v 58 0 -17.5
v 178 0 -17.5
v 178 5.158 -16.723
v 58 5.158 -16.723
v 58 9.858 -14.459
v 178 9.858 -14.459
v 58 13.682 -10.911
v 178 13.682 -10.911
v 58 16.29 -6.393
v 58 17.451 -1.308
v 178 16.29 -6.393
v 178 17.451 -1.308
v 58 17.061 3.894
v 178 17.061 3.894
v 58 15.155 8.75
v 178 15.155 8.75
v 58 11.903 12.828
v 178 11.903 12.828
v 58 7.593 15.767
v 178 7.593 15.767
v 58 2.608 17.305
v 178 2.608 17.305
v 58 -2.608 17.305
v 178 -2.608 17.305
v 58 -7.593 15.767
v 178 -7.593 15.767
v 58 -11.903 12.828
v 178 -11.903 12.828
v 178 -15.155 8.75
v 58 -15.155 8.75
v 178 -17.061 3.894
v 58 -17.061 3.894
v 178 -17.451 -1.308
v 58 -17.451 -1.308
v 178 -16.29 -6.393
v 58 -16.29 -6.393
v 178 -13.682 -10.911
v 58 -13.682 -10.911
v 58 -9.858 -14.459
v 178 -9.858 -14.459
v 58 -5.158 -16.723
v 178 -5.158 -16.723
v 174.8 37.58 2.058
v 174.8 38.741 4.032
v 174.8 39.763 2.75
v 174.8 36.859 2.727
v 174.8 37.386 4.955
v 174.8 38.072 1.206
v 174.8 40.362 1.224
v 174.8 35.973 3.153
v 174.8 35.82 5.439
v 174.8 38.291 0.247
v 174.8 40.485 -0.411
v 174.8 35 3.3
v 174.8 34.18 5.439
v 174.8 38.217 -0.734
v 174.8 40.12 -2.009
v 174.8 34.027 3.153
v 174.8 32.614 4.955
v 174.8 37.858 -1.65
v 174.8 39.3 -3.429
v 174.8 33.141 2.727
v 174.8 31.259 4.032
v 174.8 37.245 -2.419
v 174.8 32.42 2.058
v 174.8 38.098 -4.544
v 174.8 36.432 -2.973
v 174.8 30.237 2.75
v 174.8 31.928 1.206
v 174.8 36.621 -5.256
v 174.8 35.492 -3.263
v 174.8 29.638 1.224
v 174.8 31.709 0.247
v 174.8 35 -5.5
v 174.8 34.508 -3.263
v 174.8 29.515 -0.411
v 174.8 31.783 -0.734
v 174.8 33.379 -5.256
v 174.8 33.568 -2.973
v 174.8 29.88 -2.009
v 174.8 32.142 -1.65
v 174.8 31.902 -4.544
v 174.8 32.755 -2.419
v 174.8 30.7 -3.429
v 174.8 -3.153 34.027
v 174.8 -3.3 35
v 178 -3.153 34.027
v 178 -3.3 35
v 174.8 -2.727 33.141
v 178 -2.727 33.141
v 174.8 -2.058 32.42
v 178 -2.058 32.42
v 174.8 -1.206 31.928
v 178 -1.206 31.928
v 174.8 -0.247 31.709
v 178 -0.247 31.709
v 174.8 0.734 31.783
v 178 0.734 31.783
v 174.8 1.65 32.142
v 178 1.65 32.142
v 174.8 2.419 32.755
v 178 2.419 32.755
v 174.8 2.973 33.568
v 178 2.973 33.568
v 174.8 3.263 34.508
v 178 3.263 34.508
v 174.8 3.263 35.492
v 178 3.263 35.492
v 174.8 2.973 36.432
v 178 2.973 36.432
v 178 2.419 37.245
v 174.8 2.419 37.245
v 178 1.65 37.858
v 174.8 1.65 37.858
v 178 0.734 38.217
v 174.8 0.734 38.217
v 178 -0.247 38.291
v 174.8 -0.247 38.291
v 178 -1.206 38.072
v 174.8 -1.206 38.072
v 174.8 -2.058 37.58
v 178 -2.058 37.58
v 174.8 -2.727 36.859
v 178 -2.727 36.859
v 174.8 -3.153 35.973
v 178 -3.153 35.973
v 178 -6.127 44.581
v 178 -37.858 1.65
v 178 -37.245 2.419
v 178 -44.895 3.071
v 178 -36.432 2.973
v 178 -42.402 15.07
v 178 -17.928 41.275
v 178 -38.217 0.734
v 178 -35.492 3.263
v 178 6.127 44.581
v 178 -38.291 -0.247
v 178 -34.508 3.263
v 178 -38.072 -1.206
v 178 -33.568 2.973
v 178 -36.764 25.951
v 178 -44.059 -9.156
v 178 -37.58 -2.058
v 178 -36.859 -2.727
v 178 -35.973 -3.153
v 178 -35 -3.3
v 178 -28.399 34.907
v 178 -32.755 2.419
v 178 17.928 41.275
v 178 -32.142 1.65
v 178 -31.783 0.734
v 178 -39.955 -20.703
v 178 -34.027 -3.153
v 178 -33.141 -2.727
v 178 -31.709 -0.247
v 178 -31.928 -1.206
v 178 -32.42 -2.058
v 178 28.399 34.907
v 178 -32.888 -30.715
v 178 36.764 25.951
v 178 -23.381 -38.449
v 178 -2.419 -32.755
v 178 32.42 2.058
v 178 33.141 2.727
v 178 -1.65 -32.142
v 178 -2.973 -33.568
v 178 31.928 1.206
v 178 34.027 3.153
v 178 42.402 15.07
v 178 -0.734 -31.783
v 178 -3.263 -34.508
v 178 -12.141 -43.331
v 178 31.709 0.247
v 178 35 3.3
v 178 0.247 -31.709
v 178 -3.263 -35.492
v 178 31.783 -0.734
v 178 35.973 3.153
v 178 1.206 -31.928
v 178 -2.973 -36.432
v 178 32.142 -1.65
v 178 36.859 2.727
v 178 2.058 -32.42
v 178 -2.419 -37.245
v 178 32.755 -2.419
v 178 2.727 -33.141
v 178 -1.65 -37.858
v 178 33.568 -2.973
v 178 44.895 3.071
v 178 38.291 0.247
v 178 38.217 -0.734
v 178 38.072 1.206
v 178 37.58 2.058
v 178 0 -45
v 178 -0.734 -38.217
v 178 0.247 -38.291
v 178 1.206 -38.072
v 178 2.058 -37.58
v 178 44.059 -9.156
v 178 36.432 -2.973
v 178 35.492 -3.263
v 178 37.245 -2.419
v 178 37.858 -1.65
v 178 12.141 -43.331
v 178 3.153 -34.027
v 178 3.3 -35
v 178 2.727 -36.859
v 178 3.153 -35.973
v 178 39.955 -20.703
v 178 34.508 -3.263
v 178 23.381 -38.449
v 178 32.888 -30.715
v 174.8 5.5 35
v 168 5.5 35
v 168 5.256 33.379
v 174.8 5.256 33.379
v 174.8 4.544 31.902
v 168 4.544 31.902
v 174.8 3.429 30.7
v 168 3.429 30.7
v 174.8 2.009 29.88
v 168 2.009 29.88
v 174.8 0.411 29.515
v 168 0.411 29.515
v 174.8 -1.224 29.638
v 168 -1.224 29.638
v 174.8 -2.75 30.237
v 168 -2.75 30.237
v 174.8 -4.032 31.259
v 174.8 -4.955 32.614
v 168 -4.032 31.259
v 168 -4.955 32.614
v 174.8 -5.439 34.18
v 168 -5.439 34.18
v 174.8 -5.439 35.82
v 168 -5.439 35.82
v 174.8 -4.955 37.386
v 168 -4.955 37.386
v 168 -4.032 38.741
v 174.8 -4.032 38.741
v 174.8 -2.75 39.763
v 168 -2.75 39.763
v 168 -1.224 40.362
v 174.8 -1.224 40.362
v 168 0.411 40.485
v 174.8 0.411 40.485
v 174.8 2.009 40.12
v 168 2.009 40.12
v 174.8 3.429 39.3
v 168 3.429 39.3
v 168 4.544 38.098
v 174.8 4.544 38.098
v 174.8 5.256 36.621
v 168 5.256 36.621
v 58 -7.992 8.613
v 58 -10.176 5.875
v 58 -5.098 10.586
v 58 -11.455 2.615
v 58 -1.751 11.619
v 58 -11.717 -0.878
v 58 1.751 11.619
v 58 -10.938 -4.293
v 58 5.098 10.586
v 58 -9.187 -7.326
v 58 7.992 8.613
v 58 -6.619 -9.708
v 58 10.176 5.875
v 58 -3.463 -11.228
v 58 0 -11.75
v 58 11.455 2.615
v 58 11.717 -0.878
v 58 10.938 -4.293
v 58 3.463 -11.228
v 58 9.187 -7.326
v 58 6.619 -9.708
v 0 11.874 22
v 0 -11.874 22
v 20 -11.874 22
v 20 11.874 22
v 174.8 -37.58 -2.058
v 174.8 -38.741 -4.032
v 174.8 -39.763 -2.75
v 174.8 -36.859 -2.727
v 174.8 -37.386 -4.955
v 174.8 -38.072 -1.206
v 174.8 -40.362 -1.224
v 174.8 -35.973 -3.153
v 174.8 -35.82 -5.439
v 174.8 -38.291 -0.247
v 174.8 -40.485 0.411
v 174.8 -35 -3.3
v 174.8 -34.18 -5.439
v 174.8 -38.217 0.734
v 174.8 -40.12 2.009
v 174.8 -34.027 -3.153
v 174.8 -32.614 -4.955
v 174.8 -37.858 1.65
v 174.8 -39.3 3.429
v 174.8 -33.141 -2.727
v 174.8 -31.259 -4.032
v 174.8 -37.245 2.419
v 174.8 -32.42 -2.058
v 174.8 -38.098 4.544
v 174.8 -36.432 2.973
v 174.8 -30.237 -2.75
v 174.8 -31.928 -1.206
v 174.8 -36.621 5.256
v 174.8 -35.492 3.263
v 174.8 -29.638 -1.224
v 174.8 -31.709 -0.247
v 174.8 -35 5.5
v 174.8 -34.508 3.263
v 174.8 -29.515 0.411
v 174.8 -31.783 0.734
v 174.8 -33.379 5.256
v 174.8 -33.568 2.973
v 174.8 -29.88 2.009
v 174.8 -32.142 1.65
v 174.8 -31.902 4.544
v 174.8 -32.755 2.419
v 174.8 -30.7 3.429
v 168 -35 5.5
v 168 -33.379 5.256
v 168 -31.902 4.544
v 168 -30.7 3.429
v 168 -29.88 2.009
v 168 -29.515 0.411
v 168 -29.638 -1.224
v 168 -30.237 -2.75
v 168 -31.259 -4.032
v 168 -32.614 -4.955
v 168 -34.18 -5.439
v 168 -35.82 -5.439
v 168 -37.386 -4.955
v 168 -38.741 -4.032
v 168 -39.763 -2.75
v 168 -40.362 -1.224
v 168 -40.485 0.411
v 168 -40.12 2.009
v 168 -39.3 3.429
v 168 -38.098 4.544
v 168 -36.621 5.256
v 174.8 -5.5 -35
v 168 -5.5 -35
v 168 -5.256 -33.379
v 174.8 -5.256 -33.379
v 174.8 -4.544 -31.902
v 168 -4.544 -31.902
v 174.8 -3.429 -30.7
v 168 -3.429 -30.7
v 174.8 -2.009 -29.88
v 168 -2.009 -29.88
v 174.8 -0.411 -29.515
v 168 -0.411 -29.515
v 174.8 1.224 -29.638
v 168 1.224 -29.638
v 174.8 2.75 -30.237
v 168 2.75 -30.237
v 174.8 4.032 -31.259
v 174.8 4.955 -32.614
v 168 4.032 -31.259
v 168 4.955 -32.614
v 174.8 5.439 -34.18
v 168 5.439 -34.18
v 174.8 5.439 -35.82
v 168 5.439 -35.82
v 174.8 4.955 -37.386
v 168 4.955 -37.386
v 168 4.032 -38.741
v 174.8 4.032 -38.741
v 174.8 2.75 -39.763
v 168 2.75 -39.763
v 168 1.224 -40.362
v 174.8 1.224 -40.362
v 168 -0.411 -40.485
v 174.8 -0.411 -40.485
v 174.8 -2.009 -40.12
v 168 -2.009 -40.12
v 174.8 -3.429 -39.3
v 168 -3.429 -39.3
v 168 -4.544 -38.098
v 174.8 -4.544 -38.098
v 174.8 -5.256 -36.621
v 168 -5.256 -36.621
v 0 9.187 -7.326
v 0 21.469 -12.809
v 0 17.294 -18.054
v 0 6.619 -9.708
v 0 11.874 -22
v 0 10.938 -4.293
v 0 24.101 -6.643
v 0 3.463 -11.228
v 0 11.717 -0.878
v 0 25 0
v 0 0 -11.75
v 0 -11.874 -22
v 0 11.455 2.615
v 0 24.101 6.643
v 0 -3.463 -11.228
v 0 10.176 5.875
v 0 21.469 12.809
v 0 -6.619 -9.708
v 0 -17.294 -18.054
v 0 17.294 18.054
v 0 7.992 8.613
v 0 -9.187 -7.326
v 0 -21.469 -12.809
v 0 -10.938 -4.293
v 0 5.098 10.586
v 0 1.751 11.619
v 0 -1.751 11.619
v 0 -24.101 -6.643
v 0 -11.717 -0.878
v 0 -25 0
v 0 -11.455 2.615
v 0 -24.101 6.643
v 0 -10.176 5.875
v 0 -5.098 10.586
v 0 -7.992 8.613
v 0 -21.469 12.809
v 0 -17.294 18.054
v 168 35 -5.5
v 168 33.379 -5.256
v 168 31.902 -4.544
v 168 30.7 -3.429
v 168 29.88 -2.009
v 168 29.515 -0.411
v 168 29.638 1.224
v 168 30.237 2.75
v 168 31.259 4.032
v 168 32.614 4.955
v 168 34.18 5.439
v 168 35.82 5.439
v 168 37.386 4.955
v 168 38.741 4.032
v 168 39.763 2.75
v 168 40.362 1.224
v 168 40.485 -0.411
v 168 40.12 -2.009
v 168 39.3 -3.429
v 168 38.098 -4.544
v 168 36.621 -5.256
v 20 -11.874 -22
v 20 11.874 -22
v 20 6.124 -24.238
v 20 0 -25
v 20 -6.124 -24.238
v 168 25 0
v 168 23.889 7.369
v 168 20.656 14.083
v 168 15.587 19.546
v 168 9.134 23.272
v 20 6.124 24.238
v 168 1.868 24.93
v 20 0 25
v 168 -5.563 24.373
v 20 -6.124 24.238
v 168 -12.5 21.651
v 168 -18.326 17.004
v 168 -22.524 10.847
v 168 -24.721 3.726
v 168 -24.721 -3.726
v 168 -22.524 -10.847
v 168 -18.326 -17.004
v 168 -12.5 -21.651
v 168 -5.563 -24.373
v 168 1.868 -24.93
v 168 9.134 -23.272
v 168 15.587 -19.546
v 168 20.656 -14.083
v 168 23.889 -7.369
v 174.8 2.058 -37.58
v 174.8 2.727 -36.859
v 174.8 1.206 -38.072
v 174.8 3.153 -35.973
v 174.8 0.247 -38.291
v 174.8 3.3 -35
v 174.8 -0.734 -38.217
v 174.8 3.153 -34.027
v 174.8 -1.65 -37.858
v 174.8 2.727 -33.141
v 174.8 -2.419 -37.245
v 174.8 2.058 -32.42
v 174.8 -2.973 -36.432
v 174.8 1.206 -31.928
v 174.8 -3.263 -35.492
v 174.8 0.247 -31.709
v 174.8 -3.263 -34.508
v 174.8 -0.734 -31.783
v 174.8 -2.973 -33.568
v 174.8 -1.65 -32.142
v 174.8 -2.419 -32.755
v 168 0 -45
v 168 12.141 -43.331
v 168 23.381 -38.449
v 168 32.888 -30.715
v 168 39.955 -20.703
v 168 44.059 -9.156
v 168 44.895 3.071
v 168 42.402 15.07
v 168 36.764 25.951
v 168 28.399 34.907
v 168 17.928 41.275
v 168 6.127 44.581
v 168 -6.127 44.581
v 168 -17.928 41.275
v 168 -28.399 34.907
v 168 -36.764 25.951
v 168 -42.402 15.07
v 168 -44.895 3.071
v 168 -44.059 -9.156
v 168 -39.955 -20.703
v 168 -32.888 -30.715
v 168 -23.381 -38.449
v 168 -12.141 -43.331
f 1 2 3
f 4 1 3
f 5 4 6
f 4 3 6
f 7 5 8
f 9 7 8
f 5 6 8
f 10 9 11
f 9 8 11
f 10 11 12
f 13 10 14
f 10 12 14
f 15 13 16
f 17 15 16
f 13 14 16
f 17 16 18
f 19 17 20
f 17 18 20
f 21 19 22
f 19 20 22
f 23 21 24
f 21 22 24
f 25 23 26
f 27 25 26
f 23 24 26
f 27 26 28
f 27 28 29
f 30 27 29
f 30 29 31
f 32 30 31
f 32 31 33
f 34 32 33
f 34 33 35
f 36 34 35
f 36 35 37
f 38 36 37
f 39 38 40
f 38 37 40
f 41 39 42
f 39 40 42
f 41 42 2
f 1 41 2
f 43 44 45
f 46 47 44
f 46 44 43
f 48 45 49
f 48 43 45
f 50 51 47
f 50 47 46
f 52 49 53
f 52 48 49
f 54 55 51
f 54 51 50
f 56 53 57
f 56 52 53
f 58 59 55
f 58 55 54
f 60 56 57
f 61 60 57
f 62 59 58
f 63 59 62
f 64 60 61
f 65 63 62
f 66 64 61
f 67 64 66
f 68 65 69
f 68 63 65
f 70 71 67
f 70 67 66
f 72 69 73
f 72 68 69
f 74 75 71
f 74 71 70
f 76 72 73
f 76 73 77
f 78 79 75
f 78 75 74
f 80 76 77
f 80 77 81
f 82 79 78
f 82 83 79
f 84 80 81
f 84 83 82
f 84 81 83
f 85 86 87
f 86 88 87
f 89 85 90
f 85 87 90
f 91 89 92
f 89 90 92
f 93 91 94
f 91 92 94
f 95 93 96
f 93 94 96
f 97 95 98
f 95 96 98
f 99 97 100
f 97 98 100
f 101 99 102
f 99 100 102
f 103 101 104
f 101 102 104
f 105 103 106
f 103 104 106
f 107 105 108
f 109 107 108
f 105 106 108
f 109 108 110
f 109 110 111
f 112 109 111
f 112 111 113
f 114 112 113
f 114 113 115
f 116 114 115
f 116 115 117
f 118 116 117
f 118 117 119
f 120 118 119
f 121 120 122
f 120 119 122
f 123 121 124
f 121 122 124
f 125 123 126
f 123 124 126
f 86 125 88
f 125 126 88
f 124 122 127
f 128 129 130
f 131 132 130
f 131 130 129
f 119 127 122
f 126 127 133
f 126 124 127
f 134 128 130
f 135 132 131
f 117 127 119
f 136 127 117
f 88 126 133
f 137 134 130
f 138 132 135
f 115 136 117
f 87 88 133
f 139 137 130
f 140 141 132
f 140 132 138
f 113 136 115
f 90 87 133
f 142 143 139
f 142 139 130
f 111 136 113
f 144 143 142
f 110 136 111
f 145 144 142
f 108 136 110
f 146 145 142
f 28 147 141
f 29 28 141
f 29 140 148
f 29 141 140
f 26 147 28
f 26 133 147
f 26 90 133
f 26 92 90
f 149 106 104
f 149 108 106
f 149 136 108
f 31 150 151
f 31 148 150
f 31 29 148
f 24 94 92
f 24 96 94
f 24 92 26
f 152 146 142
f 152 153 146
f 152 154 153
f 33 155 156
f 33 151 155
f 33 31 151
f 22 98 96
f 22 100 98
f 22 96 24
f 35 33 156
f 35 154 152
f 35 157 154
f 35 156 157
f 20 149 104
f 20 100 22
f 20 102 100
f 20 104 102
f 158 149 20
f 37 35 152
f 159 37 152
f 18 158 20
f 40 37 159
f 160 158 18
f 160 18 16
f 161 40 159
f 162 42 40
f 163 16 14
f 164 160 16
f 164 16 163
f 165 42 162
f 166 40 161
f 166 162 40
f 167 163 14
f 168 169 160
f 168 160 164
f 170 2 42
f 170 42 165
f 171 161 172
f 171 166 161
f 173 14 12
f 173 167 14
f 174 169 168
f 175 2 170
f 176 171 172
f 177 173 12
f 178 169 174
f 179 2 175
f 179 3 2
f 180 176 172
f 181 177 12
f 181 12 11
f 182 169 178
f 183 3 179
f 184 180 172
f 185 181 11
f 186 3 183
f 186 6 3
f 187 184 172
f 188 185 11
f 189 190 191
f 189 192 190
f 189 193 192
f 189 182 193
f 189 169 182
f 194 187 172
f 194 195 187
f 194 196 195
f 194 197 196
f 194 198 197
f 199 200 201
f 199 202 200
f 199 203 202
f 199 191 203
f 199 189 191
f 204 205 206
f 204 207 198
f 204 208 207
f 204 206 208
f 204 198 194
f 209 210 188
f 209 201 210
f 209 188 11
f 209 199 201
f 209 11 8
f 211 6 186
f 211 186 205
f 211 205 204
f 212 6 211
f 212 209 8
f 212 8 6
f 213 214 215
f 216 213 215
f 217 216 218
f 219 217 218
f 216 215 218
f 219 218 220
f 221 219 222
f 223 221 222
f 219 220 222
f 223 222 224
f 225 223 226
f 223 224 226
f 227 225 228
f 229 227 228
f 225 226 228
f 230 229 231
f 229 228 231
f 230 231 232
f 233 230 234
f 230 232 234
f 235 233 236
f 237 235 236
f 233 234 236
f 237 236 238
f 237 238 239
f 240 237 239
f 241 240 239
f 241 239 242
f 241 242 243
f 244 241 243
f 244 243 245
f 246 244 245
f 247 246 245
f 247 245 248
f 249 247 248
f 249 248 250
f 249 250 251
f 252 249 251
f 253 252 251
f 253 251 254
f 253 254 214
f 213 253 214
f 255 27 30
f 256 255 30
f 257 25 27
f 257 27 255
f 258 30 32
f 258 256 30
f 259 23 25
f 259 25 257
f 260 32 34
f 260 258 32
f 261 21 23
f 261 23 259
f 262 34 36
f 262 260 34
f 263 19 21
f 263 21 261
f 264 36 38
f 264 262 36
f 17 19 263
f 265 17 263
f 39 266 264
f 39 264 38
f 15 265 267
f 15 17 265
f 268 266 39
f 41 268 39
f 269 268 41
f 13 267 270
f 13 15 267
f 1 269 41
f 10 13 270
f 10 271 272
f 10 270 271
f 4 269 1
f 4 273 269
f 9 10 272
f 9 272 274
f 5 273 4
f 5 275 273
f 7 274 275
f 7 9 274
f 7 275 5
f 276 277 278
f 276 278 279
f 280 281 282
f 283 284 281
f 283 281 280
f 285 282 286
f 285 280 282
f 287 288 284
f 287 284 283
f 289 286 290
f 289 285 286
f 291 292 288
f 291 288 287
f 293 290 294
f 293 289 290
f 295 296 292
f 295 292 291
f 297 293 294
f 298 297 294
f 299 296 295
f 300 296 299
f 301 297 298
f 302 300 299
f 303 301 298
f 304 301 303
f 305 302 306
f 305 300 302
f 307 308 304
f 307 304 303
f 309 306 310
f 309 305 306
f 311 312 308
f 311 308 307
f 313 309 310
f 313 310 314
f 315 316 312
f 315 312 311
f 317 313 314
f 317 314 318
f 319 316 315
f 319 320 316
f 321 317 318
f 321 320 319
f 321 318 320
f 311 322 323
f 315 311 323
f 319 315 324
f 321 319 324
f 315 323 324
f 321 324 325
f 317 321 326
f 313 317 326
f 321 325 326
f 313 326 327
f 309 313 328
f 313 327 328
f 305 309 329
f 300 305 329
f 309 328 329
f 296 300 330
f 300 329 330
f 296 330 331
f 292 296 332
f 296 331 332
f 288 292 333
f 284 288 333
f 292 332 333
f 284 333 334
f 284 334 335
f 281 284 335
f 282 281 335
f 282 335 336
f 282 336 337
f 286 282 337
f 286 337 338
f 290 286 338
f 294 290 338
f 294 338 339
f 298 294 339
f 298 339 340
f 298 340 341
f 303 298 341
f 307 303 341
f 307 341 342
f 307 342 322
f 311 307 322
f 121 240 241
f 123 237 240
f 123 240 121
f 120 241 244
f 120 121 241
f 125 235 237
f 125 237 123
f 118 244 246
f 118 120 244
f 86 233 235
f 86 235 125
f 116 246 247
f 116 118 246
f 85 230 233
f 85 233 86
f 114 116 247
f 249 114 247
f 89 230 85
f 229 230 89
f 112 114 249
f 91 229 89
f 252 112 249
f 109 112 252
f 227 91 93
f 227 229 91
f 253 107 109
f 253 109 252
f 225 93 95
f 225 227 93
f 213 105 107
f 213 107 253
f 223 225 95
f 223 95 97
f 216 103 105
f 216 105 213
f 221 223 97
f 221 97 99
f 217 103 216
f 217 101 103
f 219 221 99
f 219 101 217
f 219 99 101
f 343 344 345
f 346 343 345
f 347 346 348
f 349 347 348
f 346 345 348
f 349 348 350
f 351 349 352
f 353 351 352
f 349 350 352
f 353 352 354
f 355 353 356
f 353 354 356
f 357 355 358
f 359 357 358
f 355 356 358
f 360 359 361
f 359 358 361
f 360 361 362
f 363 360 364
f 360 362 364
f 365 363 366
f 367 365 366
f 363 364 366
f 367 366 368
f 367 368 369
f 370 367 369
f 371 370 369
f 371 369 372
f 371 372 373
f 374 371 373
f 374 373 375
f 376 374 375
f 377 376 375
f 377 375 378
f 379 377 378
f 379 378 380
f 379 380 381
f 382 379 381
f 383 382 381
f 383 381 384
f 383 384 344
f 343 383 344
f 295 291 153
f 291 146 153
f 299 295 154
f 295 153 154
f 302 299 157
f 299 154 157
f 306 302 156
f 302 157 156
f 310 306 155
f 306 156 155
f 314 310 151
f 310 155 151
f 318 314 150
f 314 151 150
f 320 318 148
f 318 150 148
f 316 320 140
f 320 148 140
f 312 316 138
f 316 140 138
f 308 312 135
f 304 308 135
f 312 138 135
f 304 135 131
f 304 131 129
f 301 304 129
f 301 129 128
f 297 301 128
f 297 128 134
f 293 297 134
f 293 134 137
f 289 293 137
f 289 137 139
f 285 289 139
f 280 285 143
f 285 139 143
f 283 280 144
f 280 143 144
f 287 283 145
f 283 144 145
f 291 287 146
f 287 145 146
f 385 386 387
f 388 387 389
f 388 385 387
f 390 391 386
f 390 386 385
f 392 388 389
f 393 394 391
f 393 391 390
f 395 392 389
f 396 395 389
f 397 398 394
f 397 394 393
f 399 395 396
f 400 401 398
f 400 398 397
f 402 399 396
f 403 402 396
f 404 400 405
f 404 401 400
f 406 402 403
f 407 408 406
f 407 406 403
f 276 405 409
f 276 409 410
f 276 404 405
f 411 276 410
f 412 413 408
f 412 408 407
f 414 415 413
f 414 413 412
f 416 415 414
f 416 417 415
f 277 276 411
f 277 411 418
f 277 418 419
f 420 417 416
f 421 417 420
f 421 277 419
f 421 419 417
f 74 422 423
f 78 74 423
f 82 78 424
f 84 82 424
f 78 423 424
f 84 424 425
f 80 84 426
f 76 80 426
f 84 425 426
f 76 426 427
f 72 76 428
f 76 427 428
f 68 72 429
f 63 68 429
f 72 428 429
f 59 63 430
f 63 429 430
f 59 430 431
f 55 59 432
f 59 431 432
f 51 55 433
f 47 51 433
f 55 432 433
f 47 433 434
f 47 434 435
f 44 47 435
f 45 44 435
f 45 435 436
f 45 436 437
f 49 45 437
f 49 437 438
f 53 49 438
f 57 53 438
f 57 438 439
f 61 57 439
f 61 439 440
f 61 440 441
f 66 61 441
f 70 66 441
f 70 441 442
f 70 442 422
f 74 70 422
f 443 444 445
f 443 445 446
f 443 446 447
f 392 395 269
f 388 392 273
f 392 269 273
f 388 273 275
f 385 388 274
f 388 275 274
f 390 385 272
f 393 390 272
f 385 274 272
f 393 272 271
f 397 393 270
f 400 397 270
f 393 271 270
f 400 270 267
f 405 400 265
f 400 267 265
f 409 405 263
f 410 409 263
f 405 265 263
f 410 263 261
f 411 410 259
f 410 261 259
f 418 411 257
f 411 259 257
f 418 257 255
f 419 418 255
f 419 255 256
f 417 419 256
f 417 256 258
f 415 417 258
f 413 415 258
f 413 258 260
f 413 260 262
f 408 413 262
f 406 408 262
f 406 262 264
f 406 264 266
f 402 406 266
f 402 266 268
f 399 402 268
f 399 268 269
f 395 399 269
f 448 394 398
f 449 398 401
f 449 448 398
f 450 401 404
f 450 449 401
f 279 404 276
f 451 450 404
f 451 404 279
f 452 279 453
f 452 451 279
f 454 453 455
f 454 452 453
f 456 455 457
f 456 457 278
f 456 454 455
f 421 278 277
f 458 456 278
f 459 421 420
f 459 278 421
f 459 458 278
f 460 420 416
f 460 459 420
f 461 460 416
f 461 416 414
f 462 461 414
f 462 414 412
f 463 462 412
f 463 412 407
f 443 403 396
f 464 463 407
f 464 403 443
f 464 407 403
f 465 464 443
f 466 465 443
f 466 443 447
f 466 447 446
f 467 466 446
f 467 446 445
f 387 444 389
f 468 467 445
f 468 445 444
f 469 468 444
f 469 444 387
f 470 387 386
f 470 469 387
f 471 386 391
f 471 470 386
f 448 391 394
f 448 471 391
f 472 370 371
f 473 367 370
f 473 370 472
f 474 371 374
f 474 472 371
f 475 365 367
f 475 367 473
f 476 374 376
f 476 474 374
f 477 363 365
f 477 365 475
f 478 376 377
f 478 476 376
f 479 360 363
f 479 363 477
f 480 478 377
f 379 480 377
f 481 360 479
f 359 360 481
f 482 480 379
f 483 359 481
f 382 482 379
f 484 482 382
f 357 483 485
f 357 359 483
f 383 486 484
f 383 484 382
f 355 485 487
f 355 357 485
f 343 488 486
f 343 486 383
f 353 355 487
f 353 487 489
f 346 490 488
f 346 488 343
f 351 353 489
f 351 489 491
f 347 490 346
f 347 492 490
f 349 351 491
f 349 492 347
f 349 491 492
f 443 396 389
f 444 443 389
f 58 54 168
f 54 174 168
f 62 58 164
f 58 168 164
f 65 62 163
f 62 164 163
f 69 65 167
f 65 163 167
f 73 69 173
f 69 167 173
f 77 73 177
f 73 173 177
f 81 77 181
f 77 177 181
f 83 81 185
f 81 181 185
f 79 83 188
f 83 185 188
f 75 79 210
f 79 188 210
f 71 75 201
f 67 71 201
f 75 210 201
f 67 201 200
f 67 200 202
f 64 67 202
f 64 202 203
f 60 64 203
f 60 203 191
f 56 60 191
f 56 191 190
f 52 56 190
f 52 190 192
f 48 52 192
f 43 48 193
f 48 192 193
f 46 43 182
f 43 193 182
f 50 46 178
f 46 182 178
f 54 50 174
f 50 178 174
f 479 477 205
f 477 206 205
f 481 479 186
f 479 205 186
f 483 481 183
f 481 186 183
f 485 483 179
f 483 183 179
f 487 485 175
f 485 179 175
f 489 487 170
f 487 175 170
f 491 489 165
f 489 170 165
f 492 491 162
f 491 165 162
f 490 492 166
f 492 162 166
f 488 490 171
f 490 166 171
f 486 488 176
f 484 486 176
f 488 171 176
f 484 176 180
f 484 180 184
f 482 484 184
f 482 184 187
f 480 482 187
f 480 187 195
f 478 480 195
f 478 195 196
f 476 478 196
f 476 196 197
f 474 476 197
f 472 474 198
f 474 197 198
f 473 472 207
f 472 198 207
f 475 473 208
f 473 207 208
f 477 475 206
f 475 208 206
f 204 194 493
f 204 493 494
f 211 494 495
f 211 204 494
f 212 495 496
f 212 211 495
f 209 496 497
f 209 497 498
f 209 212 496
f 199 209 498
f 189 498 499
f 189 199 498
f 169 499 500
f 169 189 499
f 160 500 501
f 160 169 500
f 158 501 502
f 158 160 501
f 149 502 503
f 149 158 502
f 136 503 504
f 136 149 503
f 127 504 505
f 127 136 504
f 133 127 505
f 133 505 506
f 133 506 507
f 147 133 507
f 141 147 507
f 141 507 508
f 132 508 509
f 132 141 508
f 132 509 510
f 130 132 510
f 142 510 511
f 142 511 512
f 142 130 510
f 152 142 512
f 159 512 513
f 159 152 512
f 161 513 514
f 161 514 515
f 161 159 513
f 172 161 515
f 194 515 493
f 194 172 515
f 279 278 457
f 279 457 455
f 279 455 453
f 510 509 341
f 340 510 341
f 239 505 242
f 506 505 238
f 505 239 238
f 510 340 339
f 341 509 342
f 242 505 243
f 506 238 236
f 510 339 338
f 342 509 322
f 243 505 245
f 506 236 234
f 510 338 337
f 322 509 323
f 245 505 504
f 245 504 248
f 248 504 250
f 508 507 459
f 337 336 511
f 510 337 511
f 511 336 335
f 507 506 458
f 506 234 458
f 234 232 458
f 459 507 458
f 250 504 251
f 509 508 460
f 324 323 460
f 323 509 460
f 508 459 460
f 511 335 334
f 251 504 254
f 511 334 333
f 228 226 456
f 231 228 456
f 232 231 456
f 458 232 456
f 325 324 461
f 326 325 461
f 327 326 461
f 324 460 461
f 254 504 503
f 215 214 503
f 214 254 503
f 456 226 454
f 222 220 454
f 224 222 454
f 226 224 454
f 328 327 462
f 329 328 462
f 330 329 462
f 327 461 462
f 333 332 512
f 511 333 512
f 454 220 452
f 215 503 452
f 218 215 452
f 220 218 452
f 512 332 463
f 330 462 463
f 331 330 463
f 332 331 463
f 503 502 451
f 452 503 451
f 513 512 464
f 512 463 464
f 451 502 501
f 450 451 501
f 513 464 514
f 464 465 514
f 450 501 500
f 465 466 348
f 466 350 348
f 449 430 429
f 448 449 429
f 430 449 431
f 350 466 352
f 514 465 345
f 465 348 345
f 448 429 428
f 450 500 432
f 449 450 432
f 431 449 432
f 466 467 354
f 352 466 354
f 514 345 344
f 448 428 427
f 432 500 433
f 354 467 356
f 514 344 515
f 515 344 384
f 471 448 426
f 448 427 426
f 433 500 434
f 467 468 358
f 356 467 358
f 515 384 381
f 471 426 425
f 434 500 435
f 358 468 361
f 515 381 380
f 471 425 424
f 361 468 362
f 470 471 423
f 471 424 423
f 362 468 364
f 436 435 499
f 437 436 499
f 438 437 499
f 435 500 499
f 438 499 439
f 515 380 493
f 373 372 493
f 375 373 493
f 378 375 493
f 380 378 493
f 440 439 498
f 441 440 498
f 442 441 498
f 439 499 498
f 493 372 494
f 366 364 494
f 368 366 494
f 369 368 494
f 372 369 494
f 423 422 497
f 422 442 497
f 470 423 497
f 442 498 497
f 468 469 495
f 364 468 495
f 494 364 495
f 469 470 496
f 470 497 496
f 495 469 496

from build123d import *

# Parameters (mm, degrees)
SKETCH_1_W                = 178
SKETCH_1_H                = 25
SKETCH_6_OUTSIDE_W        = 90.306
SKETCH_6_OUTSIDE_H        = 90.306
SKETCH_6_OUTSIDE_W_2      = 44
SKETCH_6_OUTSIDE_H_2      = 60
CUT_EXTRUDE_1_DEPTH       = 20
M26X1_5_2_D               = 23.5
SKETCH_10_R               = 45
SKETCH_10_R_2             = 25
EXTRUDE_1_DEPTH           = 10
HOLE_WIZARD_1_D           = 6.6
HOLE_WIZARD_1_CBORE_D     = 11
HOLE_WIZARD_1_CBORE_DEPTH = 6.8
PATTERN_CIRCULAR_1_COUNT  = 4
SKETCH_14_R               = 17.5
CUT_EXTRUDE_2_DEPTH       = 120


with BuildPart() as part:
    # 草图1 → 旋转1 (revolve)
    with BuildSketch(Plane.XY):
        with Locations((89, 12.5)):
            Rectangle(SKETCH_1_W, SKETCH_1_H)
    revolve(axis=Axis((-8.837336018, 0, 0), (1, 0, 0)))

    # 草图6 outside → 切除-拉伸1 (cut)
    with BuildSketch(Plane.ZY):
        Rectangle(SKETCH_6_OUTSIDE_W, SKETCH_6_OUTSIDE_H)
        Rectangle(SKETCH_6_OUTSIDE_W_2, SKETCH_6_OUTSIDE_H_2, mode=Mode.SUBTRACT)
    extrude(amount=-CUT_EXTRUDE_1_DEPTH, mode=Mode.SUBTRACT)

    # M26x1.5螺纹孔2 (through all)
    with Locations(Plane.ZY):
        with Locations((0, 0)):
            Hole(M26X1_5_2_D / 2)

    # 草图10 → 凸台-拉伸1 (add)
    with BuildSketch(Plane(origin=(178, 0, 0), x_dir=(0, 0, -1), z_dir=(1, 0, 0))):
        Circle(SKETCH_10_R)
        Circle(SKETCH_10_R_2, mode=Mode.SUBTRACT)
    extrude(amount=-EXTRUDE_1_DEPTH)

    # 打孔尺寸(%根据)内六角圆柱头螺钉的类型1 (through all)
    with Locations(Plane(origin=(168, 35, 0), x_dir=(0, 0, -1), z_dir=(-1, 0, 0))):
        with Locations((0, 0)):
            hole_wizard_1 = CounterBoreHole(HOLE_WIZARD_1_D / 2, HOLE_WIZARD_1_CBORE_D / 2, HOLE_WIZARD_1_CBORE_DEPTH)

    # 阵列(圆周)1: 打孔尺寸(%根据)内六角圆柱头螺钉的类型1 ×4 about axis
    pattern_circular_1_axis = Axis((0, 0, 0), (1, 0, 0))
    for i in range(1, PATTERN_CIRCULAR_1_COUNT):
        add(hole_wizard_1.rotate(pattern_circular_1_axis, i * 360 / PATTERN_CIRCULAR_1_COUNT), mode=Mode.SUBTRACT)

    # 草图14 → 切除-拉伸2 (cut)
    with BuildSketch(Plane(origin=(178, 0, 0), x_dir=(0, 0, -1), z_dir=(1, 0, 0))):
        Circle(SKETCH_14_R)
    extrude(amount=-CUT_EXTRUDE_2_DEPTH, mode=Mode.SUBTRACT)


solid = part.part
